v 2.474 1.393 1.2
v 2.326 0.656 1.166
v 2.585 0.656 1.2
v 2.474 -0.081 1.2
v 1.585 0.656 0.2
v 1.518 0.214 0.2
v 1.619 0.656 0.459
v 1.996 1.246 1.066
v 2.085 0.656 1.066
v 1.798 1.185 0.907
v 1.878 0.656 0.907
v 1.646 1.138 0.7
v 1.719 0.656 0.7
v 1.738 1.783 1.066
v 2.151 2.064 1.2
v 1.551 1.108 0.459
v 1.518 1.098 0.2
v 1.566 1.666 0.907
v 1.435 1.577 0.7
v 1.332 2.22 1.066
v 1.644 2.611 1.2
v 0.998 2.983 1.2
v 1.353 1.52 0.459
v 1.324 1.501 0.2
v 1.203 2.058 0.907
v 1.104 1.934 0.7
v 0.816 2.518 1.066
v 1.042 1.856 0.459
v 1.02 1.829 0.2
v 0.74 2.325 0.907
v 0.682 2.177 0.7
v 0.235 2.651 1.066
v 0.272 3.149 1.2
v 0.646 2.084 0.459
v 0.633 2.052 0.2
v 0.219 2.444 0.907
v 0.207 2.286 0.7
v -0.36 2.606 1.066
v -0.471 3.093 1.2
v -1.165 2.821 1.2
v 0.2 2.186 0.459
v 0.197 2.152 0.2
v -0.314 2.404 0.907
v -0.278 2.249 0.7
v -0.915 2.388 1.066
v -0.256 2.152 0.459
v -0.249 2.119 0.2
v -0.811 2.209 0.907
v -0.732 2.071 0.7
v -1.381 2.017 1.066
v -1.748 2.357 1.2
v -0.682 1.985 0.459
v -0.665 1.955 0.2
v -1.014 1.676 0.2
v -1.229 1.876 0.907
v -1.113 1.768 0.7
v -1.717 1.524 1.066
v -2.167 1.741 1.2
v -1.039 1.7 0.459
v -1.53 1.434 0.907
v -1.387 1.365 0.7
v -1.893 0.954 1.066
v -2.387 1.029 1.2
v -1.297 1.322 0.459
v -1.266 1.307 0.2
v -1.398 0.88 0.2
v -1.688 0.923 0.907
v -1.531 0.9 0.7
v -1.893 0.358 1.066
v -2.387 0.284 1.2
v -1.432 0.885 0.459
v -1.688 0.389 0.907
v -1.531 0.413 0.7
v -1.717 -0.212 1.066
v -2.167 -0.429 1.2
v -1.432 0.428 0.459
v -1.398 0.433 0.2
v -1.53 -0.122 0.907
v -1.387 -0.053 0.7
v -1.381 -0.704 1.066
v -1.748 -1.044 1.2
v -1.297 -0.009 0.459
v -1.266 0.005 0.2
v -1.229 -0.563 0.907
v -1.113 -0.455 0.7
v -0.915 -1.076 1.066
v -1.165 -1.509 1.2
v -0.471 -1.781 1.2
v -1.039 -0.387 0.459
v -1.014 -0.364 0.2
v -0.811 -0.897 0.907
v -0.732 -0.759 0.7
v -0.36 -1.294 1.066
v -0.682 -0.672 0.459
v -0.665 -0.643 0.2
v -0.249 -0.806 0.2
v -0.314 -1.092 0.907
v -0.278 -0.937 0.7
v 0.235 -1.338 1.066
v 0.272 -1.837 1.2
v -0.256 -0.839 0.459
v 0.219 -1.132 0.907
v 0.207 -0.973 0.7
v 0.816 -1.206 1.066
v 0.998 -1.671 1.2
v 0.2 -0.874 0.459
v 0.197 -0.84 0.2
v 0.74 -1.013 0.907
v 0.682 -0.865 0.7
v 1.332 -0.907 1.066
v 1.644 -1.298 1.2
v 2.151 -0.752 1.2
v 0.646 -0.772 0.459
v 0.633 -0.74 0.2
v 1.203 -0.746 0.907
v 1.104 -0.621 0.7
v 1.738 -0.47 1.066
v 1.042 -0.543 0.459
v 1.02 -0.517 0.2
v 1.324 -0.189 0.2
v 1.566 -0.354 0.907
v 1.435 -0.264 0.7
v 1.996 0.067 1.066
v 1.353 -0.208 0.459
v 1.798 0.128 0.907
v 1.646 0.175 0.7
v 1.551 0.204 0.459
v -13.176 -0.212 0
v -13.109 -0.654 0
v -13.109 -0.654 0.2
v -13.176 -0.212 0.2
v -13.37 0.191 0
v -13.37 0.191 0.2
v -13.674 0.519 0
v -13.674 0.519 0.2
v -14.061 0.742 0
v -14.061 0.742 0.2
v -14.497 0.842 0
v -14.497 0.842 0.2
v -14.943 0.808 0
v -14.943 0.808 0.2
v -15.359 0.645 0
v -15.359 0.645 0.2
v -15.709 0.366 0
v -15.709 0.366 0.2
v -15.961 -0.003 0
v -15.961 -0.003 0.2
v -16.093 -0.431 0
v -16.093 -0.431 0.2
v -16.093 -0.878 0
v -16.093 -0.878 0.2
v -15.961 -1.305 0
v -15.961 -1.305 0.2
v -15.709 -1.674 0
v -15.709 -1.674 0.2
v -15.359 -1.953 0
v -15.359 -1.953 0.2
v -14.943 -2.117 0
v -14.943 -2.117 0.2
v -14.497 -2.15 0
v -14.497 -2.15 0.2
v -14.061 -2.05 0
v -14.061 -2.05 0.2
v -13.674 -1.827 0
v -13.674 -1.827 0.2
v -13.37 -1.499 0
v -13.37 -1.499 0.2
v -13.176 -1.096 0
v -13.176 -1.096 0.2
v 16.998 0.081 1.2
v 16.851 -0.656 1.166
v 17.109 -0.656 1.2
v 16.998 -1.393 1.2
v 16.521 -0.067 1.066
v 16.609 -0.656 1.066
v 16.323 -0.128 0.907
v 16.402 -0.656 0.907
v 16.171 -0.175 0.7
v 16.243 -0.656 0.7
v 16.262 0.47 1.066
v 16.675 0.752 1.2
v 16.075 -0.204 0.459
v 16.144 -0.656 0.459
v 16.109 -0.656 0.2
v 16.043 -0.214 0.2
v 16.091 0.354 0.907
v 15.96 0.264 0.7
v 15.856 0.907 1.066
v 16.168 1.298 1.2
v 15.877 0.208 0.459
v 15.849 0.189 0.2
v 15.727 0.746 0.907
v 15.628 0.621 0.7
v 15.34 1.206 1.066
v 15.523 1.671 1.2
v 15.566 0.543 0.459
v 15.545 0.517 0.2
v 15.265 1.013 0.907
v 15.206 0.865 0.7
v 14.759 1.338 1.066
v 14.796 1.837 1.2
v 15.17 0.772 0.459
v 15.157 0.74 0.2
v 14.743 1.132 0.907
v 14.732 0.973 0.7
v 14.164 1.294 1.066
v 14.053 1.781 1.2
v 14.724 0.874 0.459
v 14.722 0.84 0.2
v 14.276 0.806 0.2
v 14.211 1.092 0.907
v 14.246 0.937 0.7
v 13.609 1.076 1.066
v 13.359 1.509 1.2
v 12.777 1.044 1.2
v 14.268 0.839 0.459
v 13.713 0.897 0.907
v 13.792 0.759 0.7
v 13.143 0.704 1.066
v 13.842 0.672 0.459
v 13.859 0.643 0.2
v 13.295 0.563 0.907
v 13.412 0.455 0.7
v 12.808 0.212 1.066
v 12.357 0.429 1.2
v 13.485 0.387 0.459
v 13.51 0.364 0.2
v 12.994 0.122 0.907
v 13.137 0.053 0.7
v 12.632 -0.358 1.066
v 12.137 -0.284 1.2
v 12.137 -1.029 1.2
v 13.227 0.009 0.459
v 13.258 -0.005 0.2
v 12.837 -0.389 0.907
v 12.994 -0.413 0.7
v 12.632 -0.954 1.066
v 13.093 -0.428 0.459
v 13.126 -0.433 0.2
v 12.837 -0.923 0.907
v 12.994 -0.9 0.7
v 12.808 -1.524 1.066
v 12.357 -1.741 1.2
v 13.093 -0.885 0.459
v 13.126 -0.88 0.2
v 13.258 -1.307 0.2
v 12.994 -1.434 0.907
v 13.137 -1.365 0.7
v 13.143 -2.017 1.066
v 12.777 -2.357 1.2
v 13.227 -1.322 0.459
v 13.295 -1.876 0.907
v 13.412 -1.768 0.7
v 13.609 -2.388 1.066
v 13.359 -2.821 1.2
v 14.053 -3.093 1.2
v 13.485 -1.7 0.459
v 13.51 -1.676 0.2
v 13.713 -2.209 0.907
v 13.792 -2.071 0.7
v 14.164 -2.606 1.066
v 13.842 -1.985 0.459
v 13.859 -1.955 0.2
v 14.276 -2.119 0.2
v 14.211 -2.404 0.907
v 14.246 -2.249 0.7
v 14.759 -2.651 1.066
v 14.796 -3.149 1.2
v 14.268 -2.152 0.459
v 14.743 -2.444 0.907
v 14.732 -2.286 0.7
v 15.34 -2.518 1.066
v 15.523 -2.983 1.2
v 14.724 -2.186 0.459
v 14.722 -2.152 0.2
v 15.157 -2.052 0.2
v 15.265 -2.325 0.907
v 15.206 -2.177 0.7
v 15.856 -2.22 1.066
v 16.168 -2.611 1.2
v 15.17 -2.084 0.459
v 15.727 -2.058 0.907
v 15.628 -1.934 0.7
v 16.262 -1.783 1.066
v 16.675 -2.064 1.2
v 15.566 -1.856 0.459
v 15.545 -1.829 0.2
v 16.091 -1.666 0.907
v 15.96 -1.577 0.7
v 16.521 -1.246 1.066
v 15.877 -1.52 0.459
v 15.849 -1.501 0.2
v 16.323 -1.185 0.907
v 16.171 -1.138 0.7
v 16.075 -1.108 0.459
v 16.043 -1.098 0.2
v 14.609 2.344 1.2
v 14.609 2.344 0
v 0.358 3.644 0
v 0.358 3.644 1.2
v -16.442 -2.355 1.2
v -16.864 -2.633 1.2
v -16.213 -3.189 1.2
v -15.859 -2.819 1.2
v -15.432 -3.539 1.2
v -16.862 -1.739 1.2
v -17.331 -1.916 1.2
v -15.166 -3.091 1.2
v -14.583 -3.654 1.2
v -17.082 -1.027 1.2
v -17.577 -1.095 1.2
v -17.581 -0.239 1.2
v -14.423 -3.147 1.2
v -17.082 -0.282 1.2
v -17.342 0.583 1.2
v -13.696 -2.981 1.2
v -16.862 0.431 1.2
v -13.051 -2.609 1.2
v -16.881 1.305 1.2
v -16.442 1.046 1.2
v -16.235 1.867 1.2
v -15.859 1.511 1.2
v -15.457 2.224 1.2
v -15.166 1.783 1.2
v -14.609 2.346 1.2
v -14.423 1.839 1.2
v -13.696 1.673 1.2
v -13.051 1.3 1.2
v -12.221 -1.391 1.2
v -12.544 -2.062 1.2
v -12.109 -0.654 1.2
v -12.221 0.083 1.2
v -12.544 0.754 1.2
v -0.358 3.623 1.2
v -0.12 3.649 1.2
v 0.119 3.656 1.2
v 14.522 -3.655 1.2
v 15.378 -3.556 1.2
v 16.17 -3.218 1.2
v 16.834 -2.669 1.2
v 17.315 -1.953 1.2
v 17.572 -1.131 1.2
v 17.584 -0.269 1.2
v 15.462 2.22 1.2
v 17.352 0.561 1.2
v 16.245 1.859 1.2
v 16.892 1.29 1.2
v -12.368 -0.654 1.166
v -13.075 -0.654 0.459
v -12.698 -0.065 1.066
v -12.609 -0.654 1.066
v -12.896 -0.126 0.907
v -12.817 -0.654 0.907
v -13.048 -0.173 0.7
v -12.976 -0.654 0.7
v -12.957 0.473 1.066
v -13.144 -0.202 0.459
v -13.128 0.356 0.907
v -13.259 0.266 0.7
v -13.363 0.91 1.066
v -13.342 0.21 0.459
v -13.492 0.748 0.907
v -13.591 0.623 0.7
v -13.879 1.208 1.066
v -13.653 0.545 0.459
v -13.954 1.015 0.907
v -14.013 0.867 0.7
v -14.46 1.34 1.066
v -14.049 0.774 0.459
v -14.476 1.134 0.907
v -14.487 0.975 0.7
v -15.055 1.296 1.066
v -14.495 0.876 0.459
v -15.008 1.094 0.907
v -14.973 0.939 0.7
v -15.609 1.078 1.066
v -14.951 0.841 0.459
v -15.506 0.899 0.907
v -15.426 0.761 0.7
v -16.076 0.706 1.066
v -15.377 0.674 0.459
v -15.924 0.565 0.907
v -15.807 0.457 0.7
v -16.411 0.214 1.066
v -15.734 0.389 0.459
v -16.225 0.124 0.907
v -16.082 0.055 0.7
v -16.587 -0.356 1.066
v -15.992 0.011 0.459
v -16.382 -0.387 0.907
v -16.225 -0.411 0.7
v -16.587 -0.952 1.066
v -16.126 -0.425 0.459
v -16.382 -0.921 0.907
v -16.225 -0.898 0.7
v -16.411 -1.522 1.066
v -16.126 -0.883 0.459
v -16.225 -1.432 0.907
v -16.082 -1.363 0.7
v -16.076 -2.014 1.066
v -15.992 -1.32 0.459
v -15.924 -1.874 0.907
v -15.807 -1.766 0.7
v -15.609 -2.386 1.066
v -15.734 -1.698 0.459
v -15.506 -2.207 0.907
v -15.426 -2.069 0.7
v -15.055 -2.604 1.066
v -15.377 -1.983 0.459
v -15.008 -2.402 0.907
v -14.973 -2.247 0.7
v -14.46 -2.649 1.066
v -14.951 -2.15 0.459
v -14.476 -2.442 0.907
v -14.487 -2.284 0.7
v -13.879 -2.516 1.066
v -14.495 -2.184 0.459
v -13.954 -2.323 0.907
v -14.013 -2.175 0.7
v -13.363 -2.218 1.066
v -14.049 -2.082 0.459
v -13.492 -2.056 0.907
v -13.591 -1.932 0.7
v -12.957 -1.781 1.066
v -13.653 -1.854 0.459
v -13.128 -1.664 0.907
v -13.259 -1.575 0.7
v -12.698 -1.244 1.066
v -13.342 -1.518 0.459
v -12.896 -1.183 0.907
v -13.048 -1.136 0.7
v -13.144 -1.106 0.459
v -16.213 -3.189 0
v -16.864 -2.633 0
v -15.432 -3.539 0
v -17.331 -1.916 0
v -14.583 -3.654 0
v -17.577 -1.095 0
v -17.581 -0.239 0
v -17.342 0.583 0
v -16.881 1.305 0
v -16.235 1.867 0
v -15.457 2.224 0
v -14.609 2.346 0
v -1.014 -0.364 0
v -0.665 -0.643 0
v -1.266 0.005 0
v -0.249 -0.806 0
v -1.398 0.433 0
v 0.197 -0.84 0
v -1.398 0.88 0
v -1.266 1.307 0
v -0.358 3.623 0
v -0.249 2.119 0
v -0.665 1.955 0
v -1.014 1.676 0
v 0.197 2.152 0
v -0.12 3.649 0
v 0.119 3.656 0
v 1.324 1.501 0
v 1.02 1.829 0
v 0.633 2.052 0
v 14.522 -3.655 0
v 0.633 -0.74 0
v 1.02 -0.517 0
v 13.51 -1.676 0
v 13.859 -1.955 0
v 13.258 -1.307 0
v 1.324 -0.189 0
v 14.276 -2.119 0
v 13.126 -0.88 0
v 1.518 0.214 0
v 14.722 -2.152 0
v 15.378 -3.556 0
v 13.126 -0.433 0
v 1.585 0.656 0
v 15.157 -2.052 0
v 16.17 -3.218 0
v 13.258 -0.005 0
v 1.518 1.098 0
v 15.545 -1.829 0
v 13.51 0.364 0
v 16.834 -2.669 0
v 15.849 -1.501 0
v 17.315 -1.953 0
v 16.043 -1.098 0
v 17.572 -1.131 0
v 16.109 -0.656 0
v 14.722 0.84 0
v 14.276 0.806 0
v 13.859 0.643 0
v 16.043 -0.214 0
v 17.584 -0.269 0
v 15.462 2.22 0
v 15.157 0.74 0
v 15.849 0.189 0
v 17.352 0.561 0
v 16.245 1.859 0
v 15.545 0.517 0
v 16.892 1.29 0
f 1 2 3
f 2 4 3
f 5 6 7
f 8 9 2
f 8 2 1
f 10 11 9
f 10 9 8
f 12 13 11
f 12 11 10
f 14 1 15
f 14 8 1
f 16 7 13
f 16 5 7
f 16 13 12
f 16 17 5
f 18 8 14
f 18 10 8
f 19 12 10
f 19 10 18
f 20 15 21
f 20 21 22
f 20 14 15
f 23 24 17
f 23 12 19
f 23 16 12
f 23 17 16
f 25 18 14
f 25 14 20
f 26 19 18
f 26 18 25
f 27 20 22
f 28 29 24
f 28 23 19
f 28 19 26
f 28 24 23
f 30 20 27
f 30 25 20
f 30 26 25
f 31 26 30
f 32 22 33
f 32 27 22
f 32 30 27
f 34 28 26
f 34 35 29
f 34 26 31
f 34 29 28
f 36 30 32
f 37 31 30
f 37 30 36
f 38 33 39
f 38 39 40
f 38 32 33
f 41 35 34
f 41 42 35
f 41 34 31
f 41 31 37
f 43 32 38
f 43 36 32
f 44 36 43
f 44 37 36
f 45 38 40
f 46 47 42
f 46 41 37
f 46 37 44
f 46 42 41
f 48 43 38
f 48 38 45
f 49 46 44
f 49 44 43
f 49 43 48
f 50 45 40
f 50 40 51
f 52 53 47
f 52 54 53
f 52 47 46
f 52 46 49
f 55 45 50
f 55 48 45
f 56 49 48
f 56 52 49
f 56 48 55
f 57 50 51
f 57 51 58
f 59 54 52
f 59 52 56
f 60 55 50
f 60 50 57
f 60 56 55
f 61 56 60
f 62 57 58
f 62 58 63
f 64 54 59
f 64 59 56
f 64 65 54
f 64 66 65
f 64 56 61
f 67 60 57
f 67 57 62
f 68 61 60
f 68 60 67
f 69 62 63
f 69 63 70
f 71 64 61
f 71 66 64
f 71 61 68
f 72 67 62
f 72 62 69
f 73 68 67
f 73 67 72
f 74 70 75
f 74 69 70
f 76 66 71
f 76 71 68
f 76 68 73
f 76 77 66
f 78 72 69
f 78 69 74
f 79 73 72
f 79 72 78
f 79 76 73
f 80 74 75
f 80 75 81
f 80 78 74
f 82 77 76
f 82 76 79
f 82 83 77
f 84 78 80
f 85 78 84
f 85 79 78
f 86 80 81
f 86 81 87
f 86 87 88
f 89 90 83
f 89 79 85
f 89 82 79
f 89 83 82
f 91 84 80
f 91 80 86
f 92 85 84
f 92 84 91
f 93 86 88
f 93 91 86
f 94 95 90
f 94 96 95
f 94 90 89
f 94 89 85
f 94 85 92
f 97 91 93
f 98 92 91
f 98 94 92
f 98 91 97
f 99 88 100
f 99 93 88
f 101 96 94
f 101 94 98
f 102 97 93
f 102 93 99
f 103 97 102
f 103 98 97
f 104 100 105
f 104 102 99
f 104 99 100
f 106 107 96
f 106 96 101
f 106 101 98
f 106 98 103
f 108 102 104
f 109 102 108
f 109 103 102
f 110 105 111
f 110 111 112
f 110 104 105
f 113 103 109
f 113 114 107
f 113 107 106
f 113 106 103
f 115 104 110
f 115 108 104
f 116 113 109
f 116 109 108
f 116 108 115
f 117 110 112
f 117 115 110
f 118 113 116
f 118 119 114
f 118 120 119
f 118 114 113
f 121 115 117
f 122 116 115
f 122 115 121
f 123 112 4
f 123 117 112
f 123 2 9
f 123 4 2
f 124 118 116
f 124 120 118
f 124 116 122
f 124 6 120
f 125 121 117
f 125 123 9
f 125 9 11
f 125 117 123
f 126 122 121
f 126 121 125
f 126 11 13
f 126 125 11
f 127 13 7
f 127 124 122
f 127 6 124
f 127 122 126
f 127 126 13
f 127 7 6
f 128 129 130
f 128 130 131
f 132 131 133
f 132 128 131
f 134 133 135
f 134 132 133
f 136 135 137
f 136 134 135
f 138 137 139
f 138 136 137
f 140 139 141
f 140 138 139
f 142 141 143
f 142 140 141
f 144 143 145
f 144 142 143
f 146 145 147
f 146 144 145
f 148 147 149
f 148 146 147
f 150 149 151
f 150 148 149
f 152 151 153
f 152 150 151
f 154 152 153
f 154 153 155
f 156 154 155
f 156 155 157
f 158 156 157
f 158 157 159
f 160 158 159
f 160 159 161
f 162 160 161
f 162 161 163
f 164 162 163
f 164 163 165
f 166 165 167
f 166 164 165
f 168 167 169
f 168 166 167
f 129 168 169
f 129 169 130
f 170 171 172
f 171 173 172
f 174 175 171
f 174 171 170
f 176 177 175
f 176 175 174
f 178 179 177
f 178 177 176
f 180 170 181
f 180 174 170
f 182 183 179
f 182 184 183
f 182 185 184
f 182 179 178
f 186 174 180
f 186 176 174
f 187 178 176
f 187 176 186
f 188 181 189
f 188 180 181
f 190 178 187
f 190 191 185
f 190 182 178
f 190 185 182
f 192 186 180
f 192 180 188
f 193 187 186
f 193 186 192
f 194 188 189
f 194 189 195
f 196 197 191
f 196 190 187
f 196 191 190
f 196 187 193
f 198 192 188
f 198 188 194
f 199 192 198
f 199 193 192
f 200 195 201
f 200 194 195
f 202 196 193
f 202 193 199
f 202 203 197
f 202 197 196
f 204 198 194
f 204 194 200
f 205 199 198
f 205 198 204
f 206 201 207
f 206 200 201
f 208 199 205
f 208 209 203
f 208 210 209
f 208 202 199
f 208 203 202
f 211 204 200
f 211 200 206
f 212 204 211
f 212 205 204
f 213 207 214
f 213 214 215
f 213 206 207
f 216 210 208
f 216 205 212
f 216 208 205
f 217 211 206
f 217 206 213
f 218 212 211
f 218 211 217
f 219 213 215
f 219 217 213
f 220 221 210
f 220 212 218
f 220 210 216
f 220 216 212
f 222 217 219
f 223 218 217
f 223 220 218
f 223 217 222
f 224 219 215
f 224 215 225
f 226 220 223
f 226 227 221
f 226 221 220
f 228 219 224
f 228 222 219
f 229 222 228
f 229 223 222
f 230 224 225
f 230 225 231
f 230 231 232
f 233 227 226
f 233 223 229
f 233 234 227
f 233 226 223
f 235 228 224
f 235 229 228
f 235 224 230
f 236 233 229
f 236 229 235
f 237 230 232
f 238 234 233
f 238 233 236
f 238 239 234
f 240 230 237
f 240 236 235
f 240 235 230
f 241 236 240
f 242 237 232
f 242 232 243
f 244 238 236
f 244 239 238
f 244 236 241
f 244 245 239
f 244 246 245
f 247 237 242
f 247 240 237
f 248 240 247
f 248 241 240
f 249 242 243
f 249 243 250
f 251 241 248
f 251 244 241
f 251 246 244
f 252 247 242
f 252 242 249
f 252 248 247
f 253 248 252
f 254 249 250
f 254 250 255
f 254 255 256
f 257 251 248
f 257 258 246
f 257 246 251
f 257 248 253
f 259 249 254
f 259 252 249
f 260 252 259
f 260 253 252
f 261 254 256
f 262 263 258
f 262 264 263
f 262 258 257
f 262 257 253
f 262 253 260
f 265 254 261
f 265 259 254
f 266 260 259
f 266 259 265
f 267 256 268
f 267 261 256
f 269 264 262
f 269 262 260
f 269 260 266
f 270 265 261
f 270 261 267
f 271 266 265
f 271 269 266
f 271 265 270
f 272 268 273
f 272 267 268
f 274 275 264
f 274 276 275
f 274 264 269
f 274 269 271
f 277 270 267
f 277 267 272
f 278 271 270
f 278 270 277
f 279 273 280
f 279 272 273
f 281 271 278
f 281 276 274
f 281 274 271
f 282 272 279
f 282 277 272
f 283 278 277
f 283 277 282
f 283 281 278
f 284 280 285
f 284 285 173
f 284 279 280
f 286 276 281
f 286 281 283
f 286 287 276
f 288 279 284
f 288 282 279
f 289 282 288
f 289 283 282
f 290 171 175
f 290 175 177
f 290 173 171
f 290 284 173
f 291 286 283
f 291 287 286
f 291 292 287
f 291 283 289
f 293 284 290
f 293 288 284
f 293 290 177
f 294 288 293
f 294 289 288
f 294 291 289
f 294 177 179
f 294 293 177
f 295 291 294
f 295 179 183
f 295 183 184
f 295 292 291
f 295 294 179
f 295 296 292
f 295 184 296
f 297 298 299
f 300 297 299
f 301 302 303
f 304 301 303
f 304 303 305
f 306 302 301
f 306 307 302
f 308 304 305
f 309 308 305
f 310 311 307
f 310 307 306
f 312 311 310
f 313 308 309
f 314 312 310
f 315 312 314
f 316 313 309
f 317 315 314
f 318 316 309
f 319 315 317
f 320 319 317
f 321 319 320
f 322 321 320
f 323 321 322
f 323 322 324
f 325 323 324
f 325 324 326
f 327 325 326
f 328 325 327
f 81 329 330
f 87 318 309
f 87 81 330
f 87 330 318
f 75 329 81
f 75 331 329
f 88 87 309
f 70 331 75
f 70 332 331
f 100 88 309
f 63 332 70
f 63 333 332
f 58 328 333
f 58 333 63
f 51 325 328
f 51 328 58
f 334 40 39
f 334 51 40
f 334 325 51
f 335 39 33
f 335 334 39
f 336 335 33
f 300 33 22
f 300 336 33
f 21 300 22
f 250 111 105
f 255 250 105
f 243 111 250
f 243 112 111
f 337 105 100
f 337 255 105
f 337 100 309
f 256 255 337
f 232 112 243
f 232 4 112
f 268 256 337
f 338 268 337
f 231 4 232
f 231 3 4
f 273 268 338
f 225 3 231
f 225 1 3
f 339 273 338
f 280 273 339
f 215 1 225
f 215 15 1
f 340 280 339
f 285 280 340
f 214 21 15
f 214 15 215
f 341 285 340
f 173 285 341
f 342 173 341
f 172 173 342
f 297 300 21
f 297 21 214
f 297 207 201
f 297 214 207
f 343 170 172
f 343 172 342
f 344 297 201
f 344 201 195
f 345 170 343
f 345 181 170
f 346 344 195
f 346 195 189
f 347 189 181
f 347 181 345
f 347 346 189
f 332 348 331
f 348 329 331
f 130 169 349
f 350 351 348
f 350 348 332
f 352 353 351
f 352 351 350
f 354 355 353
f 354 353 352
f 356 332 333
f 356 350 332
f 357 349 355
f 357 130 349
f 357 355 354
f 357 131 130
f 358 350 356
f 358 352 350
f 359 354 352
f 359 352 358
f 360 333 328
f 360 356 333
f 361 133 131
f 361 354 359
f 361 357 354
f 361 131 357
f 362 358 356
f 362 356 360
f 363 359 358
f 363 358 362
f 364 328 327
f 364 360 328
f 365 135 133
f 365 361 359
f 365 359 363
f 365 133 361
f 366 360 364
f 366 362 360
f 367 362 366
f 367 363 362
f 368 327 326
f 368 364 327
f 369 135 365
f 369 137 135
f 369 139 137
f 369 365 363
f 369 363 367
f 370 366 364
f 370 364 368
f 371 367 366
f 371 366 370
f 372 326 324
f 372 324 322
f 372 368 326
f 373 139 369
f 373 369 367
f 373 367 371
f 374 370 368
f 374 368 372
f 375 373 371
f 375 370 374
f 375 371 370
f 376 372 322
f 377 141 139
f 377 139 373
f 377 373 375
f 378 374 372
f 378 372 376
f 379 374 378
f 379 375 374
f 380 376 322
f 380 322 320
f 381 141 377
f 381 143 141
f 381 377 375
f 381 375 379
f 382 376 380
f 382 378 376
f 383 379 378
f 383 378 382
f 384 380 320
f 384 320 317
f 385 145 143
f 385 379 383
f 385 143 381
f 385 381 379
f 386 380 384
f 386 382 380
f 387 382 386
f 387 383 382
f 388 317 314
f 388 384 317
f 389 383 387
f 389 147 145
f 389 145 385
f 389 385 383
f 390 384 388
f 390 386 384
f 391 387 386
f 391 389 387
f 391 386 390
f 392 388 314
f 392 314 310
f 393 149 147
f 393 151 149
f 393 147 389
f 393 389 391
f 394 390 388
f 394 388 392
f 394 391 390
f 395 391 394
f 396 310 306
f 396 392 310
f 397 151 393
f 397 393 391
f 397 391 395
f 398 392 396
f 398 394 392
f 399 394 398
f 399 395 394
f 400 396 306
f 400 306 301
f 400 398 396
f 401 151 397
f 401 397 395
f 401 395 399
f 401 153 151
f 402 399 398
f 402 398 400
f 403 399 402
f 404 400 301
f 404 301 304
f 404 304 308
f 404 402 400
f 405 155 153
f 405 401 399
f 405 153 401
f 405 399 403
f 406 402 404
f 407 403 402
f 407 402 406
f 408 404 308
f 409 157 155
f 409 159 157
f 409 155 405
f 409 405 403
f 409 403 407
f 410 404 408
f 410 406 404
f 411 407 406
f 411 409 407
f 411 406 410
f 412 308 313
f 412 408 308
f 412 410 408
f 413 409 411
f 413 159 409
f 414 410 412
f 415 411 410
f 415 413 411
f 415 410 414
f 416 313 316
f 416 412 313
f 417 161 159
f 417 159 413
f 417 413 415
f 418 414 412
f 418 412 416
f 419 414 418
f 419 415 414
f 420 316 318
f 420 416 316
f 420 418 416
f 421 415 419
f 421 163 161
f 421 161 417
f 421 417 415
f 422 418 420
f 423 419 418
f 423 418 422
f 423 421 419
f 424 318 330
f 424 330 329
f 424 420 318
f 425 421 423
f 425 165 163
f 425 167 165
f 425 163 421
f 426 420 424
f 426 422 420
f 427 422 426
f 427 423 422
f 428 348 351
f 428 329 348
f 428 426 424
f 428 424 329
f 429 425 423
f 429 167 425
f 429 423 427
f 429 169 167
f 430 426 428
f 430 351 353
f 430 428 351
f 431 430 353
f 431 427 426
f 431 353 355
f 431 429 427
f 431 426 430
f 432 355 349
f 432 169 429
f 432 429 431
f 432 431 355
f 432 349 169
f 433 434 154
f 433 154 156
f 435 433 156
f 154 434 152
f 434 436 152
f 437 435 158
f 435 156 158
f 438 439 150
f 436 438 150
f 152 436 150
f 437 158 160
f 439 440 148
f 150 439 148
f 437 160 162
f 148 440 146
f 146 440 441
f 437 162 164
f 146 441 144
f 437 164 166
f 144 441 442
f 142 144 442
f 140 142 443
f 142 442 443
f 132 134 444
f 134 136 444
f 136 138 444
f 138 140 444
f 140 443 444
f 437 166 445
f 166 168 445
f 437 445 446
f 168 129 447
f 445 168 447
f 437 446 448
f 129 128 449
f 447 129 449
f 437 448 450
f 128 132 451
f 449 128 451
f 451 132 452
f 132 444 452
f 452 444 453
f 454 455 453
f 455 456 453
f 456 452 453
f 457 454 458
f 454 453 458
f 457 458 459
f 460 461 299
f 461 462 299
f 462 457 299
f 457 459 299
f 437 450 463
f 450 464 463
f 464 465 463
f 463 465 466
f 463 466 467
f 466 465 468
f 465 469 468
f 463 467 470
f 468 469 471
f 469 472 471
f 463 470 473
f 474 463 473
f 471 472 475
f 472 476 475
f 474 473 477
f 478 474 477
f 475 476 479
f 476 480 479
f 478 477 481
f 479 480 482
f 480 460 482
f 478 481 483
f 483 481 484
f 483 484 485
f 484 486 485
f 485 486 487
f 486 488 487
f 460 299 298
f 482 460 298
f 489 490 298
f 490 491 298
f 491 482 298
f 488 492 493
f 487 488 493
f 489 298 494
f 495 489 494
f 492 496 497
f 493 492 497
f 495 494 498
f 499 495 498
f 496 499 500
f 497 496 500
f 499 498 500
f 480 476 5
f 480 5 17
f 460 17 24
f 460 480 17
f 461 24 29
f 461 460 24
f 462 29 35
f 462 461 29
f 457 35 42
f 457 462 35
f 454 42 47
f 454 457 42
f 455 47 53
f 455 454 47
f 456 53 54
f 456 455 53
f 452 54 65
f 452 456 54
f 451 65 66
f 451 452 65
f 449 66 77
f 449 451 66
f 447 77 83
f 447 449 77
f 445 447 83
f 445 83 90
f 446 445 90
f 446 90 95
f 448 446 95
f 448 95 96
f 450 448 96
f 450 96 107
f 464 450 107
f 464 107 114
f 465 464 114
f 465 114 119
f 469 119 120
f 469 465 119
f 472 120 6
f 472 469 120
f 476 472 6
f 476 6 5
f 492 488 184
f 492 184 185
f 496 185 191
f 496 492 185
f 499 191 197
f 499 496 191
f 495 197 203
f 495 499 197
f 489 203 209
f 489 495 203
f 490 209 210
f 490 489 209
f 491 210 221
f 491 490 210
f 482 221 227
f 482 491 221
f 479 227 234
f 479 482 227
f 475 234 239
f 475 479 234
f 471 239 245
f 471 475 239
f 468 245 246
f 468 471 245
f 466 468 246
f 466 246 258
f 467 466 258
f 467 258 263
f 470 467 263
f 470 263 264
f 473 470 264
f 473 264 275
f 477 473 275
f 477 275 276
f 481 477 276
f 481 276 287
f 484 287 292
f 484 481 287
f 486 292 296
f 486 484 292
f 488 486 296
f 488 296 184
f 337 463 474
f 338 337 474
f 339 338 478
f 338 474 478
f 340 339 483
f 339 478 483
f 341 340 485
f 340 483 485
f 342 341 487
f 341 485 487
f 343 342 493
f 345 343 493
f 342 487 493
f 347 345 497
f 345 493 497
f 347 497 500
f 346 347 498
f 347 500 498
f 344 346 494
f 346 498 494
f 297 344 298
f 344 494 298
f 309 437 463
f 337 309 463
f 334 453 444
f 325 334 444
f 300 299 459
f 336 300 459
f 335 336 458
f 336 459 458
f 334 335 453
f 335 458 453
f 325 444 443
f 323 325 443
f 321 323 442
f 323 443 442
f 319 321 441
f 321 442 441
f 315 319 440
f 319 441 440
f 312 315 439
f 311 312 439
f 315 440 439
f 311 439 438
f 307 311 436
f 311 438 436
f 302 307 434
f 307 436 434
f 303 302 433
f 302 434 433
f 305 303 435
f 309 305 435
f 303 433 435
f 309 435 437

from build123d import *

# Parameters (mm, degrees)
SKETCH_1_R        = 3
SKETCH_1_R_2      = 1.5
EXTRUDE_1_DEPTH   = 1.2
EXTRUDE_1_2_DEPTH = 1.2
EXTRUDE_1_3_DEPTH = 1.2
EXTRUDE_START     = -1.2
EXTRUDE_6_DEPTH   = 1.2
FILLET_1_R        = 1


# Read off the part's stored shape, not the designer's step: Бобышка-Вытянуть6
with BuildPart() as part:
    # Эскиз1 → Бобышка-Вытянуть1 (new body)
    with BuildSketch(Plane.XY):
        with Locations((-14.609483562, -0.654127434)):
            Circle(SKETCH_1_R)
        with Locations((-14.609483562, -0.654127434)):
            Circle(SKETCH_1_R_2, mode=Mode.SUBTRACT)
    extrude(amount=EXTRUDE_1_DEPTH)



with BuildPart() as body_2:
    # Эскиз1 → Extrude 1 2 (new body)
    with BuildSketch(Plane.XY):
        with Locations((0.085103447, 0.656172203)):
            Circle(SKETCH_1_R)
        with Locations((0.085103447, 0.656172203)):
            Circle(SKETCH_1_R_2, mode=Mode.SUBTRACT)
    extrude(amount=EXTRUDE_1_2_DEPTH)


with BuildPart() as body_3:
    # Эскиз1 → Extrude 1 3 (new body)
    with BuildSketch(Plane.XY):
        with Locations((14.609483562, -0.656172203)):
            Circle(SKETCH_1_R)
        with Locations((14.609483562, -0.656172203)):
            Circle(SKETCH_1_R_2, mode=Mode.SUBTRACT)
    extrude(amount=EXTRUDE_1_3_DEPTH)


with BuildPart() as part_1:
    add(part.part)

    add(body_2.part)  # Бобышка-Вытянуть6 merges body 2

    add(body_3.part)  # Бобышка-Вытянуть6 merges body 3
    # Бобышка-Вытянуть6 outline → Бобышка-Вытянуть6 (add)
    with BuildSketch(Plane.XY.offset(1.2).offset(EXTRUDE_START)):
        with BuildLine():
            Line((-0.357791462, 3.62329945), (-14.609483562, 2.345872566))
            ThreePointArc((-14.609483562, 2.345872566), (-11.609512533, -0.640943153), (-14.583115254, -3.65401155))
            Line((-14.583115254, -3.65401155), (14.52155751, -3.654883428))
            ThreePointArc((14.52155751, -3.654883428), (11.609805773, -0.612204455), (14.609483562, 2.343827797))
            Line((14.609483562, 2.343827797), (0.357607149, 3.64377019))
            ThreePointArc((0.357607149, 3.64377019), (0.170911685, -2.34260037), (-0.357791462, 3.62329945))
        make_face()
    extrude(amount=EXTRUDE_6_DEPTH)

    # Скругление1
    fillet_1_edges = [part_1.edges().sort_by_distance(p)[0] for p in [
        (-1.414896553, 0.656172203, 1.2),
        (13.109483562, -0.656172203, 1.2),
        (-16.109483562, -0.654127434, 1.2),
    ]]
    fillet(fillet_1_edges, radius=FILLET_1_R)


solid = part_1.part
